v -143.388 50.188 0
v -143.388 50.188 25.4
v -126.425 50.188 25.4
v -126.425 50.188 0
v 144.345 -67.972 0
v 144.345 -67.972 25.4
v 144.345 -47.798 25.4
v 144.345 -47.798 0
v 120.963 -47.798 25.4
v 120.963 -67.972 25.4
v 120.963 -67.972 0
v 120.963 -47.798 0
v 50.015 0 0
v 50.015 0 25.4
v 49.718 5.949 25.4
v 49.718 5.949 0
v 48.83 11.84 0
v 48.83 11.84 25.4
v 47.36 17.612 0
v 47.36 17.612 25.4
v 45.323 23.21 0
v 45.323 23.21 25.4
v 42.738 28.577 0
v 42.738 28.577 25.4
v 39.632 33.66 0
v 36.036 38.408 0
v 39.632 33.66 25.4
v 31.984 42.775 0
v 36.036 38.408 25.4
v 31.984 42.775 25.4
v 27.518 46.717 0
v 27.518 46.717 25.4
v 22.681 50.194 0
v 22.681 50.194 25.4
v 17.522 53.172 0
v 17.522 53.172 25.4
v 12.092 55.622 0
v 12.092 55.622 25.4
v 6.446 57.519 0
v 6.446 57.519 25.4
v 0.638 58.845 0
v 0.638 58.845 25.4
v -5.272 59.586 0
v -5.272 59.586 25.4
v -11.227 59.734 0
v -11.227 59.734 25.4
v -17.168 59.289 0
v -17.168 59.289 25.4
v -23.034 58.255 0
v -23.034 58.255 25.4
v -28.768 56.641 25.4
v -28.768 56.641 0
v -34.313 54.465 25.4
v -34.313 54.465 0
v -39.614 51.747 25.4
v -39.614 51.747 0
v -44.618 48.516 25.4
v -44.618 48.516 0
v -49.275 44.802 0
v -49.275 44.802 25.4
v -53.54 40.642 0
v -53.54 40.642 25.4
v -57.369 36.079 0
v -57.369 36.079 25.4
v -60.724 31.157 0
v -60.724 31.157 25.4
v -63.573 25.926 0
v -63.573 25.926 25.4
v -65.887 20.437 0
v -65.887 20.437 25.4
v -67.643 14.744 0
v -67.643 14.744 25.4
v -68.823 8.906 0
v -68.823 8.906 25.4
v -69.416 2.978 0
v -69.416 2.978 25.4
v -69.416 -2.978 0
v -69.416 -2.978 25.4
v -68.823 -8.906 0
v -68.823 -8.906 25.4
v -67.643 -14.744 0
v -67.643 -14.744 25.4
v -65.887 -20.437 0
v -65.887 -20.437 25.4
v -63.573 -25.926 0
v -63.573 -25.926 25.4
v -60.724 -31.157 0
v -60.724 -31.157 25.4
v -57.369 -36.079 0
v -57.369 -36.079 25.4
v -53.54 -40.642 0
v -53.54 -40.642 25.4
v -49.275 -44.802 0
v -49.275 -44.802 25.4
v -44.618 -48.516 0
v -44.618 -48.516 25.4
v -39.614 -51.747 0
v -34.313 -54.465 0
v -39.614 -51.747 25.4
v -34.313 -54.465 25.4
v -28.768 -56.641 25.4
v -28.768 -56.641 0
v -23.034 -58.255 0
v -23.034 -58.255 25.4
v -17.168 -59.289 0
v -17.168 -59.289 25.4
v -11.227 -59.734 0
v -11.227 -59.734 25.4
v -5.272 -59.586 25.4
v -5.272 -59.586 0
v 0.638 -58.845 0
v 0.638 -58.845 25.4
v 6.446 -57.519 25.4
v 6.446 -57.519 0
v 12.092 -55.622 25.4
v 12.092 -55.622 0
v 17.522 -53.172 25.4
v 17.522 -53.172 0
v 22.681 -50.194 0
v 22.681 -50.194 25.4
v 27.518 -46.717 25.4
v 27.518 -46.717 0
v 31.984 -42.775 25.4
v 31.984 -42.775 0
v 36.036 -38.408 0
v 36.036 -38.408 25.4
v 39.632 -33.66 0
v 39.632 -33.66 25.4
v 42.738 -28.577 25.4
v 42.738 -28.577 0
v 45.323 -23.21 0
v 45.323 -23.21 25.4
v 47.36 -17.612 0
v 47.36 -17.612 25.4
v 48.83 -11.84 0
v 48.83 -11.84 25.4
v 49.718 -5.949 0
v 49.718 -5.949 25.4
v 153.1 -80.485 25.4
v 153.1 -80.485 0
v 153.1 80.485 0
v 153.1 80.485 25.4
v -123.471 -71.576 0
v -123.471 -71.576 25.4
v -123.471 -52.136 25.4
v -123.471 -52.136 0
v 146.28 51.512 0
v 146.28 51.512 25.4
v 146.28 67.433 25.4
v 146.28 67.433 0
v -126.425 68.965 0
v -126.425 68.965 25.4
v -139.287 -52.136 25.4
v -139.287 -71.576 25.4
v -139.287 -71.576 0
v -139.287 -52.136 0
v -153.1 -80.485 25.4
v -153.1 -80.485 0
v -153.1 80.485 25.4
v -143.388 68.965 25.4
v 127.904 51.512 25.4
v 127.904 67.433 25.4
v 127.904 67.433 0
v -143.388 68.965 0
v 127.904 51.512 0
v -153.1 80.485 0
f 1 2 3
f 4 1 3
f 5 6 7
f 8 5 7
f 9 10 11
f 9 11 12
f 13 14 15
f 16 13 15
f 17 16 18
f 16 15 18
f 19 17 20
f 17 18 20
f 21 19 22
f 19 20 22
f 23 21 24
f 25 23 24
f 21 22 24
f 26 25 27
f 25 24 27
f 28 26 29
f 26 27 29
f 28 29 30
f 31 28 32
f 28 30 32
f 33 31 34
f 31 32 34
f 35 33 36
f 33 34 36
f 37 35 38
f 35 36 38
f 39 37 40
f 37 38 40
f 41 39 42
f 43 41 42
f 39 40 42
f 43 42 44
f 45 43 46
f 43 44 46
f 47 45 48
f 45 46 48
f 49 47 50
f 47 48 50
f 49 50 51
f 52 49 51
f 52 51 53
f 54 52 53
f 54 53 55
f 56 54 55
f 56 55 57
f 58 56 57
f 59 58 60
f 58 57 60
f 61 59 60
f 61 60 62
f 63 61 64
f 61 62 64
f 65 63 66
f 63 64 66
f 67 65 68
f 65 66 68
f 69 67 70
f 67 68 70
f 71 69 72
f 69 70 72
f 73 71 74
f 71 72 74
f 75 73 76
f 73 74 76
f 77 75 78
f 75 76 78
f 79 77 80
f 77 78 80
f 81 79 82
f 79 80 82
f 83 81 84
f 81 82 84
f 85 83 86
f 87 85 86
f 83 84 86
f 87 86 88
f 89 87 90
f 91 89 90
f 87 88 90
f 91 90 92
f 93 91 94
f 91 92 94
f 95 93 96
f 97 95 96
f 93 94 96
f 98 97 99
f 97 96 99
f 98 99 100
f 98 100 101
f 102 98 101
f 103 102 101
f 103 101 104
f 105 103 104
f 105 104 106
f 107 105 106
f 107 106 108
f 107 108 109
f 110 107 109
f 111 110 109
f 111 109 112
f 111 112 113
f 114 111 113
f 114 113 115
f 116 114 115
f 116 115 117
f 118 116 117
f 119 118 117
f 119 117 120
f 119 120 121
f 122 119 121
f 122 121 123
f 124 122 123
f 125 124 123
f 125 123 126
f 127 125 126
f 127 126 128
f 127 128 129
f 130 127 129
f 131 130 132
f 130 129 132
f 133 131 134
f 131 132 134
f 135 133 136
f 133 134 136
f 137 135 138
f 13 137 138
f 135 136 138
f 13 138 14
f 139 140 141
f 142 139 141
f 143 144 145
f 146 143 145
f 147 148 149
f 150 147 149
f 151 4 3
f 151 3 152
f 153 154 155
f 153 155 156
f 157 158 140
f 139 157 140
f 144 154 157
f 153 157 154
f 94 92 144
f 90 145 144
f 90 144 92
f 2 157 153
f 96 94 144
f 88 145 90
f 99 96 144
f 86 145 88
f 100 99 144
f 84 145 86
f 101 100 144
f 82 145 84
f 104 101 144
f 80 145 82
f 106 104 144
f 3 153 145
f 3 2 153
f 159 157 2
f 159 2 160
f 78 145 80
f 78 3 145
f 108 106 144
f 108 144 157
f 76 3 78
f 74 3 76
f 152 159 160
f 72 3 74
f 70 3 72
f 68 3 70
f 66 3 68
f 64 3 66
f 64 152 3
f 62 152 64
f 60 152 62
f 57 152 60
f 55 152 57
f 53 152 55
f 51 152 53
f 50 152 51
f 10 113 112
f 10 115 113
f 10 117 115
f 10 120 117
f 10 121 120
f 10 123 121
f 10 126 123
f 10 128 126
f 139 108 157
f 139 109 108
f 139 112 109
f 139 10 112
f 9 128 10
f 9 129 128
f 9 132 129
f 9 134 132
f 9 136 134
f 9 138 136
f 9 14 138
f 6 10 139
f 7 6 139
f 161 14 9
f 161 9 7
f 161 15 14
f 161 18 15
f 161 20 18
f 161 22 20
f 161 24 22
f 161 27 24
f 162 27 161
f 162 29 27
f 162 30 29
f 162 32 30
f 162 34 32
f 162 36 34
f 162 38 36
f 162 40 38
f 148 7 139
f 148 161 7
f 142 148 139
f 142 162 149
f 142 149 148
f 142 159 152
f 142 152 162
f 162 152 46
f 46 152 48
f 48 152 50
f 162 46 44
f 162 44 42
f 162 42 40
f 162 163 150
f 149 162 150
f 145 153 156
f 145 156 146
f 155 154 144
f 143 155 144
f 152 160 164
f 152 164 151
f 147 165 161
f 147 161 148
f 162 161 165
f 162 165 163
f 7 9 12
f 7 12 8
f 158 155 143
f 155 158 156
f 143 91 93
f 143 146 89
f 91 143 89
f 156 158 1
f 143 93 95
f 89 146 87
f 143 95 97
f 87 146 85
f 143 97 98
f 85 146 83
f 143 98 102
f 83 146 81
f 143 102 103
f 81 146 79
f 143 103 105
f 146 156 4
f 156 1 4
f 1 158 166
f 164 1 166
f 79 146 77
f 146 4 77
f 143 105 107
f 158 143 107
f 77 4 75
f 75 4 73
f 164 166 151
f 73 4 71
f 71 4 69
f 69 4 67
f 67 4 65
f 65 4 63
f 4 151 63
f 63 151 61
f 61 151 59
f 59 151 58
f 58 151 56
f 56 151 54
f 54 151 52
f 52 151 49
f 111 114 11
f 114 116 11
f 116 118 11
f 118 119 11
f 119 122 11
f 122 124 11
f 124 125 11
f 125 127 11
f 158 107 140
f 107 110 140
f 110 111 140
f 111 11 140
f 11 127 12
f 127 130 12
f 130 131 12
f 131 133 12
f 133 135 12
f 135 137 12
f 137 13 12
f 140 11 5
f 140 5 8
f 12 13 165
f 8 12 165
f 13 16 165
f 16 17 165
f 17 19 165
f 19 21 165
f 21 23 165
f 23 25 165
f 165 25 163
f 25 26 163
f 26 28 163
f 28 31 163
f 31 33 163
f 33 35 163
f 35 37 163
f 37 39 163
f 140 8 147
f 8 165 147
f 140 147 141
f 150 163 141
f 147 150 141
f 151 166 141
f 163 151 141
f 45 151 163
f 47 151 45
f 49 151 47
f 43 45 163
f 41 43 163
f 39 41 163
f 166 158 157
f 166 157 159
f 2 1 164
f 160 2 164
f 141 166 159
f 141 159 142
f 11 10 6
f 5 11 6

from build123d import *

# Parameters (mm, degrees)
F0_W      = 306.200504303
F0_H      = 160.9693467617
F1_DEPTH  = 25.4
F2_W      = 16.9635862112
F2_H      = 18.7774226069
F2_W_2    = 18.3757990599
F2_H_2    = 15.9212723374
F2_W_3    = 15.8156380057
F2_H_3    = 19.4401964545
F3_DEPTH  = 25.4
F4_W      = 23.3820155263
F4_H      = 20.1737955213
F5_DEPTH  = 25.4
F10_W     = 156.8522006273
F10_H     = 128.1716823578
F10_W_2   = 155.7295322418
F10_H_2   = 9.3674659729
F11_DEPTH = 25.4
F12_R     = 59.7527814568
F13_DEPTH = 25.4


# Not quite as in the source:
# - a feature of the source that left no trace in its solid (it failed there, or was rolled back) is left out


with BuildPart() as f1:
    # F0 (on Top) → F1 (new body)
    with BuildSketch(Plane.XY):
        Rectangle(F0_W, F0_H)
    extrude(amount=F1_DEPTH)

    # F2 (on face) → F3 (cut)
    with BuildSketch(Plane.XY.offset(25.4)):
        with Locations((-134.9064931273, 59.5765523612)):
            Rectangle(F2_W, F2_H)
        with Locations((137.0917782187, 59.4723559916)):
            Rectangle(F2_W_2, F2_H_2)
        with Locations((-131.3789226115, -61.8558935821)):
            Rectangle(F2_W_3, F2_H_3)
    extrude(amount=-F3_DEPTH, mode=Mode.SUBTRACT)

    # F4 (on face) → F5 (cut)
    with BuildSketch(Plane.XY.offset(25.4)):
        with Locations((132.6544694602, -57.8851737082)):
            Rectangle(F4_W, F4_H)
    extrude(amount=-F5_DEPTH, mode=Mode.SUBTRACT)

    # F10 (on Right) → F11 (cut)
    with BuildSketch(Plane.YZ):
        with Locations((274.1180285811, -160.389393568)):
            Rectangle(F10_W, F10_H)
        with Locations((-275.496006012, 285.2313816547)):
            Rectangle(F10_W_2, F10_H_2)
    extrude(amount=-F11_DEPTH, mode=Mode.SUBTRACT)

    # F12 (on face) → F13 (cut)
    with BuildSketch(Plane.XY.offset(25.4)):
        with Locations((-9.737694636, 0)):
            Circle(F12_R)
    extrude(amount=-F13_DEPTH, mode=Mode.SUBTRACT)


solid = f1.part
